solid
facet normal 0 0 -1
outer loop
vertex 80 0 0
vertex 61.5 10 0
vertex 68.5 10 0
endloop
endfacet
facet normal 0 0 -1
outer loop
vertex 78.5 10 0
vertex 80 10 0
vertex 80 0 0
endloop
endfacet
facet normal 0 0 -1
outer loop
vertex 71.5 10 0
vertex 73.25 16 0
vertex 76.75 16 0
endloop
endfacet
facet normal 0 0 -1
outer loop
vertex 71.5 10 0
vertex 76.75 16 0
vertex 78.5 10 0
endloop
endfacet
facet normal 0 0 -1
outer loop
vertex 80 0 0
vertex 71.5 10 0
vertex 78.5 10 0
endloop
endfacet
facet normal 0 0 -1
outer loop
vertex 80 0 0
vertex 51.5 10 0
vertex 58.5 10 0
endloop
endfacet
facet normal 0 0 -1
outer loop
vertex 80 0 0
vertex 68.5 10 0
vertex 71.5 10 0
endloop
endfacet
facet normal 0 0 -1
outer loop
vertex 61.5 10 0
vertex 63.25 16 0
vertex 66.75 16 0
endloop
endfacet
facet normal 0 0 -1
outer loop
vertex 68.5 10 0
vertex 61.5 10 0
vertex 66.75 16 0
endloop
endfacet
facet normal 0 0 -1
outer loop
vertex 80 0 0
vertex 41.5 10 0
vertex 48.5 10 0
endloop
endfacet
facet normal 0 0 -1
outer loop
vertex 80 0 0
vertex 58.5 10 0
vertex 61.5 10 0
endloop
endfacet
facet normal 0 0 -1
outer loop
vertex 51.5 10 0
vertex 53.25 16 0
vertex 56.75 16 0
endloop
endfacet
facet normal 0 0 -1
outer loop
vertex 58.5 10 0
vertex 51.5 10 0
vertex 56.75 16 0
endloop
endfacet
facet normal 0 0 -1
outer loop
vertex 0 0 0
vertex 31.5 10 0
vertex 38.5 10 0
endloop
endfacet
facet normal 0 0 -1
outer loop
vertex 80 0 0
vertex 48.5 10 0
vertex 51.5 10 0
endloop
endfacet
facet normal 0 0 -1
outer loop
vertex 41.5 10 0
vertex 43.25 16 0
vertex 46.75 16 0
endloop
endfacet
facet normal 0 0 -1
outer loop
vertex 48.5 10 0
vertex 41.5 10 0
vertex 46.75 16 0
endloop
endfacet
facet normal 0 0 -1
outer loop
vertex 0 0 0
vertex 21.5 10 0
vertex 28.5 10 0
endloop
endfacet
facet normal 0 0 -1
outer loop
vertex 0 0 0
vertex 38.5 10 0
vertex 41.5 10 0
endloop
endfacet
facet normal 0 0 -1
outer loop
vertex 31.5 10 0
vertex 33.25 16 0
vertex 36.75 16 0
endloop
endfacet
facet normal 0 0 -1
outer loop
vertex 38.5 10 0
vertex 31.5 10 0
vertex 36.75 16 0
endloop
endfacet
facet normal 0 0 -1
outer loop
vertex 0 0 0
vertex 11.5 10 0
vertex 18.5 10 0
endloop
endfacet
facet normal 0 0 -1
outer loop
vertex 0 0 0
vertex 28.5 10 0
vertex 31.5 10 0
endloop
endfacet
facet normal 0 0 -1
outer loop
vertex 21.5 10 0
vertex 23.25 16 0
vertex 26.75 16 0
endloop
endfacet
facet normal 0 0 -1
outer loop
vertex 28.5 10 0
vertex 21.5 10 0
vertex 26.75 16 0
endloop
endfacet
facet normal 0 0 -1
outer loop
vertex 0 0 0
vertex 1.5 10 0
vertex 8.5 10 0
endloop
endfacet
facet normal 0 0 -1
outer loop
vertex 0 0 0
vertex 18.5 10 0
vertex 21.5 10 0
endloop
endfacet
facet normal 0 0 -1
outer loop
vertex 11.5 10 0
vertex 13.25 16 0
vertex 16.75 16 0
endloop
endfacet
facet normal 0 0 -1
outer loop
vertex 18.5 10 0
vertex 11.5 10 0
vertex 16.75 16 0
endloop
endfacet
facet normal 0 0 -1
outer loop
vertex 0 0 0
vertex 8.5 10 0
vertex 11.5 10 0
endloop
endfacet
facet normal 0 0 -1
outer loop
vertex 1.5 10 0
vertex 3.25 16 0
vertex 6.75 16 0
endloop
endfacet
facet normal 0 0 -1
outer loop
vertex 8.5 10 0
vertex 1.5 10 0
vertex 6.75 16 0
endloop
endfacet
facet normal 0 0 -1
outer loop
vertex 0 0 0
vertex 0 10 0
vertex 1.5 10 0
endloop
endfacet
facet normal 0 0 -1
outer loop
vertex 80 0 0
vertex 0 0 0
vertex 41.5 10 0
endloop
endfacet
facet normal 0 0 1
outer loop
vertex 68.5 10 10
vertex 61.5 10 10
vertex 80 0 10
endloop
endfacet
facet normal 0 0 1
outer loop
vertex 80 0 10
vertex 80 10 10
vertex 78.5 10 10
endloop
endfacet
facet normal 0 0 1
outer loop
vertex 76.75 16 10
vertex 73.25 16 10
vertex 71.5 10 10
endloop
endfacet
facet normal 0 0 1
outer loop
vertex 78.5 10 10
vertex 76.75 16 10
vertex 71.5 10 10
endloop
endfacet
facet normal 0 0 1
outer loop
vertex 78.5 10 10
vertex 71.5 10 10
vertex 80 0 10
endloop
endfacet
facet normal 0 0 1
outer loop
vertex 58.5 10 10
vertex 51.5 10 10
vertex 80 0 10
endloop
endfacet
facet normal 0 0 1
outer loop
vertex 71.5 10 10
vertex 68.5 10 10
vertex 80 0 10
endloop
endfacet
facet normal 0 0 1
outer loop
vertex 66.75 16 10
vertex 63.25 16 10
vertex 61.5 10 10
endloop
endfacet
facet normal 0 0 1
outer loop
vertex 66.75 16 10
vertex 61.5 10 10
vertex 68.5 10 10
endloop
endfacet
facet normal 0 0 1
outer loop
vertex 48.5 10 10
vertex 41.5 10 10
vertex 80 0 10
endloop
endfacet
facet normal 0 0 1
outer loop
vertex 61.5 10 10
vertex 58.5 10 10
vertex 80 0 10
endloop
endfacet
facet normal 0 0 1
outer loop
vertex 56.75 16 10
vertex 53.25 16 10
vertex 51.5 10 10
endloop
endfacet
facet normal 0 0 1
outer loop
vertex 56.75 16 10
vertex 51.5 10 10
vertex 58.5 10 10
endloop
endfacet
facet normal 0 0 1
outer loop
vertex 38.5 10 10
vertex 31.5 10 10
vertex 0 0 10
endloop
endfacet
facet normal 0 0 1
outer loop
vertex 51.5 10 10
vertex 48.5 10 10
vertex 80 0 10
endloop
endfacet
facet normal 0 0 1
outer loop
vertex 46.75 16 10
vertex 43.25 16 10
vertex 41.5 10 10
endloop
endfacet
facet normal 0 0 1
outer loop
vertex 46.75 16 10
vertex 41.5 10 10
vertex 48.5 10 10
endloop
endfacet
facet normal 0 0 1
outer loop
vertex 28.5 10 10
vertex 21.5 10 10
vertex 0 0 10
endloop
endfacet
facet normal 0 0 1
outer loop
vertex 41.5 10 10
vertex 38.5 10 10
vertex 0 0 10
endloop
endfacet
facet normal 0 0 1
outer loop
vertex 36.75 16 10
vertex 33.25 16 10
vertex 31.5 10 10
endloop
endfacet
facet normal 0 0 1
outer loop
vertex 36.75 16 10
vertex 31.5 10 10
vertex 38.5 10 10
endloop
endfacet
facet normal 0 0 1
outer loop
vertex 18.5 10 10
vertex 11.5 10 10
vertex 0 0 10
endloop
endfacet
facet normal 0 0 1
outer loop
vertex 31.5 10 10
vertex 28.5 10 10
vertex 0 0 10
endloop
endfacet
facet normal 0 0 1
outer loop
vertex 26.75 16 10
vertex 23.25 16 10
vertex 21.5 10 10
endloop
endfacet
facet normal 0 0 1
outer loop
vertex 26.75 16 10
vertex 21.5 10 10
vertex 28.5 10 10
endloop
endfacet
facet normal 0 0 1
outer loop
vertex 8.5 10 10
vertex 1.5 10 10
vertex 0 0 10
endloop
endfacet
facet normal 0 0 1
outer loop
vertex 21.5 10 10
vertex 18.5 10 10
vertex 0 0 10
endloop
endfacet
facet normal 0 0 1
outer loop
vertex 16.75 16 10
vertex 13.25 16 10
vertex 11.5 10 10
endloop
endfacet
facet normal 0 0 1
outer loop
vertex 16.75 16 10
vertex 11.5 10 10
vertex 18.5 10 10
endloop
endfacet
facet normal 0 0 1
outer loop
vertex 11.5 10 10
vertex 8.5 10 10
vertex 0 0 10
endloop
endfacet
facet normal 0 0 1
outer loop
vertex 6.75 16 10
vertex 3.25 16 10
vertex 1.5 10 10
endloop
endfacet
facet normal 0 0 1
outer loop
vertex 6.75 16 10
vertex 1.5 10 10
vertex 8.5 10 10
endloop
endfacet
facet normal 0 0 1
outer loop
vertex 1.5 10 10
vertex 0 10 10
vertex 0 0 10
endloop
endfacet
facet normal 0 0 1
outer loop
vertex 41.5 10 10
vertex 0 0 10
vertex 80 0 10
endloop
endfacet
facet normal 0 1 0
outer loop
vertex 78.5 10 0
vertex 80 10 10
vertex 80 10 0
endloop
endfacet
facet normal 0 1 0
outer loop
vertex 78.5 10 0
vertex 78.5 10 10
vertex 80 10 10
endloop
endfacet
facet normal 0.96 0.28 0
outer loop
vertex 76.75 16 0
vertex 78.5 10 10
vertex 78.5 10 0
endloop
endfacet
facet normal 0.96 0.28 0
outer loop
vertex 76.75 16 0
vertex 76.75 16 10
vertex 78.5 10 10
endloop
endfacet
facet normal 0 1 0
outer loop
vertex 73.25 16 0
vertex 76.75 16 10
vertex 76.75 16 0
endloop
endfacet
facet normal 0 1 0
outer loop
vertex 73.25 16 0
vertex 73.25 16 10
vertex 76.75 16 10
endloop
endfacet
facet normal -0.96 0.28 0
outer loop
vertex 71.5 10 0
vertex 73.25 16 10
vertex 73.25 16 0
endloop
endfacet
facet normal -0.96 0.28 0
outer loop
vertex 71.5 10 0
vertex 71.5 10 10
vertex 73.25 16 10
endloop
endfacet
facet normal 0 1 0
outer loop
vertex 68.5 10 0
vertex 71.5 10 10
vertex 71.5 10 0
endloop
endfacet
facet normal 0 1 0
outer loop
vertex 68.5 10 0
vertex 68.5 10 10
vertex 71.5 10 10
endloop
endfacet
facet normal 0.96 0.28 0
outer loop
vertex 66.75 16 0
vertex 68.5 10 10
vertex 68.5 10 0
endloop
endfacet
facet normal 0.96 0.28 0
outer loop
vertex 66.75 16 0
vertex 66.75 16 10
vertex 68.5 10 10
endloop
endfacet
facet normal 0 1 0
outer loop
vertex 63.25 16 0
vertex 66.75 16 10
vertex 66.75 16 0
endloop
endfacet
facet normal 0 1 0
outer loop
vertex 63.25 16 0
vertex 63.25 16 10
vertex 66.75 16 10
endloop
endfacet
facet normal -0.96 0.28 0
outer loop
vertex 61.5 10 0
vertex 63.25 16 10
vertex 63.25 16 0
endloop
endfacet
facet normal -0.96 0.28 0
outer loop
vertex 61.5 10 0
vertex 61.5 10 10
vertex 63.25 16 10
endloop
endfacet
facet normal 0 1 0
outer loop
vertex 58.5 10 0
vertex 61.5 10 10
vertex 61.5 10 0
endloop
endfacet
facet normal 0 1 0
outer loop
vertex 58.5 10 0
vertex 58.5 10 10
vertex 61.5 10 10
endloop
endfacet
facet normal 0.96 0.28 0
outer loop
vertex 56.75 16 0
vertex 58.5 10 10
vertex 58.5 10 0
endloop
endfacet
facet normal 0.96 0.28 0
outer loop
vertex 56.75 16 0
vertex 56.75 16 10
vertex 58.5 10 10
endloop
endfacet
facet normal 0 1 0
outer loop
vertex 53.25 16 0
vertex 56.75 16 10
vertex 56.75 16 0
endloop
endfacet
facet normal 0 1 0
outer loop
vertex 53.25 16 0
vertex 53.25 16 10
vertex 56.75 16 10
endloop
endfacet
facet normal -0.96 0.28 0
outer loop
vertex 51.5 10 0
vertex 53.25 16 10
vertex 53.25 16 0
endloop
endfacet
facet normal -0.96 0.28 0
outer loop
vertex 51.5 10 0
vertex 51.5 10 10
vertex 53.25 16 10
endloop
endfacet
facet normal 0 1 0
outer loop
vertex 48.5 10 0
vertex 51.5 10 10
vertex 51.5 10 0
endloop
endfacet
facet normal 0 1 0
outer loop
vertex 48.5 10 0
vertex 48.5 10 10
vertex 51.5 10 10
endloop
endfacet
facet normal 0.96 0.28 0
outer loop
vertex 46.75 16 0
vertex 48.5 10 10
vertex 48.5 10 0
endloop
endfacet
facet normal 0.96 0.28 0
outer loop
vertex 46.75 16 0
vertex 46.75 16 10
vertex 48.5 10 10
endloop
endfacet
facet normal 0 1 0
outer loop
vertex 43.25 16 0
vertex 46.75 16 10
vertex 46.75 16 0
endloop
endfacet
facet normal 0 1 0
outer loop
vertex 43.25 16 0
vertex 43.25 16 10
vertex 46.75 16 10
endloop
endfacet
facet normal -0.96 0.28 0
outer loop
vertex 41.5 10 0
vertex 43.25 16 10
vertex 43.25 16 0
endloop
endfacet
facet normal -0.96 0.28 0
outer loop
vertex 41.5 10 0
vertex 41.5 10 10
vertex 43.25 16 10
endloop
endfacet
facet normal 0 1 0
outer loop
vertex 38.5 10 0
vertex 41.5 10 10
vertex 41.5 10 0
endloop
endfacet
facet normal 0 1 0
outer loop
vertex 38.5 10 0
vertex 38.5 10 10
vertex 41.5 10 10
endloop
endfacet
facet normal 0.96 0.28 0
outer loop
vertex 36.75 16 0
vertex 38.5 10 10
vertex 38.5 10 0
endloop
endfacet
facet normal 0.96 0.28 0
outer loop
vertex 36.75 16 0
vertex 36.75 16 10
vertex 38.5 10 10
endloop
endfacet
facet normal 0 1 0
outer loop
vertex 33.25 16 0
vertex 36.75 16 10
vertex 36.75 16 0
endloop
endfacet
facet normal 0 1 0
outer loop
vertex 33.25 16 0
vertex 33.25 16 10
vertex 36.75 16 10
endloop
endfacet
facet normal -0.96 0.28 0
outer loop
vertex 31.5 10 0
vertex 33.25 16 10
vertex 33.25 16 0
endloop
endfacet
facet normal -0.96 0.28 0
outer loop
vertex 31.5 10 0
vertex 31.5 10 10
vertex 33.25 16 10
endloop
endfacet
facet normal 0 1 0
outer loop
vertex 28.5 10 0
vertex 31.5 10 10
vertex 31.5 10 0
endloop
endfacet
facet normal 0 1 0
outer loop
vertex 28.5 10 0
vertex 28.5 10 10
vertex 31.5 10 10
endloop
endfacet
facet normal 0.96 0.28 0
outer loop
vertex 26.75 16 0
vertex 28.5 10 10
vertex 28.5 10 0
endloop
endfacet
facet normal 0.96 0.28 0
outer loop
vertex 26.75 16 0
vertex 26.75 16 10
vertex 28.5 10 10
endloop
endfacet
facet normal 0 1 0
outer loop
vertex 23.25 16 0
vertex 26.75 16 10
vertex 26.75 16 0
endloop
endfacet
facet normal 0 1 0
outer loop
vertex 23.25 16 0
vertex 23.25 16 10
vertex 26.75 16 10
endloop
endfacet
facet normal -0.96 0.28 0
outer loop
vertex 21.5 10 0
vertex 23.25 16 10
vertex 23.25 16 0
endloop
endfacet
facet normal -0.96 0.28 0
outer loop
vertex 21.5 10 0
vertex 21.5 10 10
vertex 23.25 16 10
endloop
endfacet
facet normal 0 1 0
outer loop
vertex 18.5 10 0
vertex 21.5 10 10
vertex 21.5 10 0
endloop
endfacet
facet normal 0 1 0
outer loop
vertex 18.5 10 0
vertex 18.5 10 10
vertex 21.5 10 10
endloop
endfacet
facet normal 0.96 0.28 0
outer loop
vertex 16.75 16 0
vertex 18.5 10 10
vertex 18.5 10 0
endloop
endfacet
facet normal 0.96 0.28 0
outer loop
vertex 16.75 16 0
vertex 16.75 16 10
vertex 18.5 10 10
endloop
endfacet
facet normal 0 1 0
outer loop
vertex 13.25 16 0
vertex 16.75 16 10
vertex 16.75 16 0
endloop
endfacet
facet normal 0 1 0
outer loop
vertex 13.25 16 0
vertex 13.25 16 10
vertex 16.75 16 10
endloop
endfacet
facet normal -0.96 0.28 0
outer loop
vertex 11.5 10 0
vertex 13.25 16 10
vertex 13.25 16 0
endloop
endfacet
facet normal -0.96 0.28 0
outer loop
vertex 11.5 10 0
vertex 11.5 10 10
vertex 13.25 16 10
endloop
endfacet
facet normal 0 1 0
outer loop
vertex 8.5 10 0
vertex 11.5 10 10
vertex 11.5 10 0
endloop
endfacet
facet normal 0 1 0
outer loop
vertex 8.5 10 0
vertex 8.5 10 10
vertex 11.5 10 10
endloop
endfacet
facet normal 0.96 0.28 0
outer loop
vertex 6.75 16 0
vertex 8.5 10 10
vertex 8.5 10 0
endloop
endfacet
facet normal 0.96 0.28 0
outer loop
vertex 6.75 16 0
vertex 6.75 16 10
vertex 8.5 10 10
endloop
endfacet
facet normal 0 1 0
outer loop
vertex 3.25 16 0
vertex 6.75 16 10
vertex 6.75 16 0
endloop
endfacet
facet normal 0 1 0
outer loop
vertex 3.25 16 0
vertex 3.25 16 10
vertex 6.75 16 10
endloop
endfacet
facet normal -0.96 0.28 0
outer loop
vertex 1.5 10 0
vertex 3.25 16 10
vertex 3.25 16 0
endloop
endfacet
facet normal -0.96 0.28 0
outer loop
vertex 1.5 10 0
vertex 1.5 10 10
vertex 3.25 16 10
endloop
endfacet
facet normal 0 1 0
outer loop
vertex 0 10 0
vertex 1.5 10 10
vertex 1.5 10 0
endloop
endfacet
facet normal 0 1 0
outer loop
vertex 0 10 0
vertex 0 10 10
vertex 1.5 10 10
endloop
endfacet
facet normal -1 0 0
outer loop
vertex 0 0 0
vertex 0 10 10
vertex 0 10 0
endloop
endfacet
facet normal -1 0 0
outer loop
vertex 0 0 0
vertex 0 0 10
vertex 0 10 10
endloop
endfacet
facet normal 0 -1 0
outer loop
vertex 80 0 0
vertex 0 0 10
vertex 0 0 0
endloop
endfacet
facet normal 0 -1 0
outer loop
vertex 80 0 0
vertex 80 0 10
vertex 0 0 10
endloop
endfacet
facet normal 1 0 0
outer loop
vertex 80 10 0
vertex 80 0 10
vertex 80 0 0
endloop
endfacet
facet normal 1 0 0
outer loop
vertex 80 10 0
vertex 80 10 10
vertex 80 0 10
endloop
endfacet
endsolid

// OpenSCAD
$fn = 32;

// ----------------------------------------------------------------------
// Gear rack: 8 teeth, pitch 10 mm
// ----------------------------------------------------------------------

// --- parameters (mm) ---
teeth = 8;                // number of teeth
pitch = 10;               // tooth pitch, X
root_w = 7;               // tooth width at the root
tip_w = 3.5;              // tooth width at the tip
base_h = 10;              // rack body height, Y
tooth_h = 6;              // tooth height above the body
plate_t = 10;             // rack width, Z (extrusion height)

rack_l = teeth * pitch;  // overall length
total_h = base_h + tooth_h;  // overall height

profile = [[0, 0], [80, 0], [80, 10], [78.5, 10], [76.75, 16], [73.25, 16], [71.5, 10], [68.5, 10], [66.75, 16], [63.25, 16], [61.5, 10], [58.5, 10], [56.75, 16], [53.25, 16], [51.5, 10], [48.5, 10], [46.75, 16], [43.25, 16], [41.5, 10], [38.5, 10], [36.75, 16], [33.25, 16], [31.5, 10], [28.5, 10], [26.75, 16], [23.25, 16], [21.5, 10], [18.5, 10], [16.75, 16], [13.25, 16], [11.5, 10], [8.5, 10], [6.75, 16], [3.25, 16], [1.5, 10], [0, 10]];  // primary outline, 36 points, counter clockwise

// --- the one profile operation ---
linear_extrude(height = plate_t) polygon(points = profile);
